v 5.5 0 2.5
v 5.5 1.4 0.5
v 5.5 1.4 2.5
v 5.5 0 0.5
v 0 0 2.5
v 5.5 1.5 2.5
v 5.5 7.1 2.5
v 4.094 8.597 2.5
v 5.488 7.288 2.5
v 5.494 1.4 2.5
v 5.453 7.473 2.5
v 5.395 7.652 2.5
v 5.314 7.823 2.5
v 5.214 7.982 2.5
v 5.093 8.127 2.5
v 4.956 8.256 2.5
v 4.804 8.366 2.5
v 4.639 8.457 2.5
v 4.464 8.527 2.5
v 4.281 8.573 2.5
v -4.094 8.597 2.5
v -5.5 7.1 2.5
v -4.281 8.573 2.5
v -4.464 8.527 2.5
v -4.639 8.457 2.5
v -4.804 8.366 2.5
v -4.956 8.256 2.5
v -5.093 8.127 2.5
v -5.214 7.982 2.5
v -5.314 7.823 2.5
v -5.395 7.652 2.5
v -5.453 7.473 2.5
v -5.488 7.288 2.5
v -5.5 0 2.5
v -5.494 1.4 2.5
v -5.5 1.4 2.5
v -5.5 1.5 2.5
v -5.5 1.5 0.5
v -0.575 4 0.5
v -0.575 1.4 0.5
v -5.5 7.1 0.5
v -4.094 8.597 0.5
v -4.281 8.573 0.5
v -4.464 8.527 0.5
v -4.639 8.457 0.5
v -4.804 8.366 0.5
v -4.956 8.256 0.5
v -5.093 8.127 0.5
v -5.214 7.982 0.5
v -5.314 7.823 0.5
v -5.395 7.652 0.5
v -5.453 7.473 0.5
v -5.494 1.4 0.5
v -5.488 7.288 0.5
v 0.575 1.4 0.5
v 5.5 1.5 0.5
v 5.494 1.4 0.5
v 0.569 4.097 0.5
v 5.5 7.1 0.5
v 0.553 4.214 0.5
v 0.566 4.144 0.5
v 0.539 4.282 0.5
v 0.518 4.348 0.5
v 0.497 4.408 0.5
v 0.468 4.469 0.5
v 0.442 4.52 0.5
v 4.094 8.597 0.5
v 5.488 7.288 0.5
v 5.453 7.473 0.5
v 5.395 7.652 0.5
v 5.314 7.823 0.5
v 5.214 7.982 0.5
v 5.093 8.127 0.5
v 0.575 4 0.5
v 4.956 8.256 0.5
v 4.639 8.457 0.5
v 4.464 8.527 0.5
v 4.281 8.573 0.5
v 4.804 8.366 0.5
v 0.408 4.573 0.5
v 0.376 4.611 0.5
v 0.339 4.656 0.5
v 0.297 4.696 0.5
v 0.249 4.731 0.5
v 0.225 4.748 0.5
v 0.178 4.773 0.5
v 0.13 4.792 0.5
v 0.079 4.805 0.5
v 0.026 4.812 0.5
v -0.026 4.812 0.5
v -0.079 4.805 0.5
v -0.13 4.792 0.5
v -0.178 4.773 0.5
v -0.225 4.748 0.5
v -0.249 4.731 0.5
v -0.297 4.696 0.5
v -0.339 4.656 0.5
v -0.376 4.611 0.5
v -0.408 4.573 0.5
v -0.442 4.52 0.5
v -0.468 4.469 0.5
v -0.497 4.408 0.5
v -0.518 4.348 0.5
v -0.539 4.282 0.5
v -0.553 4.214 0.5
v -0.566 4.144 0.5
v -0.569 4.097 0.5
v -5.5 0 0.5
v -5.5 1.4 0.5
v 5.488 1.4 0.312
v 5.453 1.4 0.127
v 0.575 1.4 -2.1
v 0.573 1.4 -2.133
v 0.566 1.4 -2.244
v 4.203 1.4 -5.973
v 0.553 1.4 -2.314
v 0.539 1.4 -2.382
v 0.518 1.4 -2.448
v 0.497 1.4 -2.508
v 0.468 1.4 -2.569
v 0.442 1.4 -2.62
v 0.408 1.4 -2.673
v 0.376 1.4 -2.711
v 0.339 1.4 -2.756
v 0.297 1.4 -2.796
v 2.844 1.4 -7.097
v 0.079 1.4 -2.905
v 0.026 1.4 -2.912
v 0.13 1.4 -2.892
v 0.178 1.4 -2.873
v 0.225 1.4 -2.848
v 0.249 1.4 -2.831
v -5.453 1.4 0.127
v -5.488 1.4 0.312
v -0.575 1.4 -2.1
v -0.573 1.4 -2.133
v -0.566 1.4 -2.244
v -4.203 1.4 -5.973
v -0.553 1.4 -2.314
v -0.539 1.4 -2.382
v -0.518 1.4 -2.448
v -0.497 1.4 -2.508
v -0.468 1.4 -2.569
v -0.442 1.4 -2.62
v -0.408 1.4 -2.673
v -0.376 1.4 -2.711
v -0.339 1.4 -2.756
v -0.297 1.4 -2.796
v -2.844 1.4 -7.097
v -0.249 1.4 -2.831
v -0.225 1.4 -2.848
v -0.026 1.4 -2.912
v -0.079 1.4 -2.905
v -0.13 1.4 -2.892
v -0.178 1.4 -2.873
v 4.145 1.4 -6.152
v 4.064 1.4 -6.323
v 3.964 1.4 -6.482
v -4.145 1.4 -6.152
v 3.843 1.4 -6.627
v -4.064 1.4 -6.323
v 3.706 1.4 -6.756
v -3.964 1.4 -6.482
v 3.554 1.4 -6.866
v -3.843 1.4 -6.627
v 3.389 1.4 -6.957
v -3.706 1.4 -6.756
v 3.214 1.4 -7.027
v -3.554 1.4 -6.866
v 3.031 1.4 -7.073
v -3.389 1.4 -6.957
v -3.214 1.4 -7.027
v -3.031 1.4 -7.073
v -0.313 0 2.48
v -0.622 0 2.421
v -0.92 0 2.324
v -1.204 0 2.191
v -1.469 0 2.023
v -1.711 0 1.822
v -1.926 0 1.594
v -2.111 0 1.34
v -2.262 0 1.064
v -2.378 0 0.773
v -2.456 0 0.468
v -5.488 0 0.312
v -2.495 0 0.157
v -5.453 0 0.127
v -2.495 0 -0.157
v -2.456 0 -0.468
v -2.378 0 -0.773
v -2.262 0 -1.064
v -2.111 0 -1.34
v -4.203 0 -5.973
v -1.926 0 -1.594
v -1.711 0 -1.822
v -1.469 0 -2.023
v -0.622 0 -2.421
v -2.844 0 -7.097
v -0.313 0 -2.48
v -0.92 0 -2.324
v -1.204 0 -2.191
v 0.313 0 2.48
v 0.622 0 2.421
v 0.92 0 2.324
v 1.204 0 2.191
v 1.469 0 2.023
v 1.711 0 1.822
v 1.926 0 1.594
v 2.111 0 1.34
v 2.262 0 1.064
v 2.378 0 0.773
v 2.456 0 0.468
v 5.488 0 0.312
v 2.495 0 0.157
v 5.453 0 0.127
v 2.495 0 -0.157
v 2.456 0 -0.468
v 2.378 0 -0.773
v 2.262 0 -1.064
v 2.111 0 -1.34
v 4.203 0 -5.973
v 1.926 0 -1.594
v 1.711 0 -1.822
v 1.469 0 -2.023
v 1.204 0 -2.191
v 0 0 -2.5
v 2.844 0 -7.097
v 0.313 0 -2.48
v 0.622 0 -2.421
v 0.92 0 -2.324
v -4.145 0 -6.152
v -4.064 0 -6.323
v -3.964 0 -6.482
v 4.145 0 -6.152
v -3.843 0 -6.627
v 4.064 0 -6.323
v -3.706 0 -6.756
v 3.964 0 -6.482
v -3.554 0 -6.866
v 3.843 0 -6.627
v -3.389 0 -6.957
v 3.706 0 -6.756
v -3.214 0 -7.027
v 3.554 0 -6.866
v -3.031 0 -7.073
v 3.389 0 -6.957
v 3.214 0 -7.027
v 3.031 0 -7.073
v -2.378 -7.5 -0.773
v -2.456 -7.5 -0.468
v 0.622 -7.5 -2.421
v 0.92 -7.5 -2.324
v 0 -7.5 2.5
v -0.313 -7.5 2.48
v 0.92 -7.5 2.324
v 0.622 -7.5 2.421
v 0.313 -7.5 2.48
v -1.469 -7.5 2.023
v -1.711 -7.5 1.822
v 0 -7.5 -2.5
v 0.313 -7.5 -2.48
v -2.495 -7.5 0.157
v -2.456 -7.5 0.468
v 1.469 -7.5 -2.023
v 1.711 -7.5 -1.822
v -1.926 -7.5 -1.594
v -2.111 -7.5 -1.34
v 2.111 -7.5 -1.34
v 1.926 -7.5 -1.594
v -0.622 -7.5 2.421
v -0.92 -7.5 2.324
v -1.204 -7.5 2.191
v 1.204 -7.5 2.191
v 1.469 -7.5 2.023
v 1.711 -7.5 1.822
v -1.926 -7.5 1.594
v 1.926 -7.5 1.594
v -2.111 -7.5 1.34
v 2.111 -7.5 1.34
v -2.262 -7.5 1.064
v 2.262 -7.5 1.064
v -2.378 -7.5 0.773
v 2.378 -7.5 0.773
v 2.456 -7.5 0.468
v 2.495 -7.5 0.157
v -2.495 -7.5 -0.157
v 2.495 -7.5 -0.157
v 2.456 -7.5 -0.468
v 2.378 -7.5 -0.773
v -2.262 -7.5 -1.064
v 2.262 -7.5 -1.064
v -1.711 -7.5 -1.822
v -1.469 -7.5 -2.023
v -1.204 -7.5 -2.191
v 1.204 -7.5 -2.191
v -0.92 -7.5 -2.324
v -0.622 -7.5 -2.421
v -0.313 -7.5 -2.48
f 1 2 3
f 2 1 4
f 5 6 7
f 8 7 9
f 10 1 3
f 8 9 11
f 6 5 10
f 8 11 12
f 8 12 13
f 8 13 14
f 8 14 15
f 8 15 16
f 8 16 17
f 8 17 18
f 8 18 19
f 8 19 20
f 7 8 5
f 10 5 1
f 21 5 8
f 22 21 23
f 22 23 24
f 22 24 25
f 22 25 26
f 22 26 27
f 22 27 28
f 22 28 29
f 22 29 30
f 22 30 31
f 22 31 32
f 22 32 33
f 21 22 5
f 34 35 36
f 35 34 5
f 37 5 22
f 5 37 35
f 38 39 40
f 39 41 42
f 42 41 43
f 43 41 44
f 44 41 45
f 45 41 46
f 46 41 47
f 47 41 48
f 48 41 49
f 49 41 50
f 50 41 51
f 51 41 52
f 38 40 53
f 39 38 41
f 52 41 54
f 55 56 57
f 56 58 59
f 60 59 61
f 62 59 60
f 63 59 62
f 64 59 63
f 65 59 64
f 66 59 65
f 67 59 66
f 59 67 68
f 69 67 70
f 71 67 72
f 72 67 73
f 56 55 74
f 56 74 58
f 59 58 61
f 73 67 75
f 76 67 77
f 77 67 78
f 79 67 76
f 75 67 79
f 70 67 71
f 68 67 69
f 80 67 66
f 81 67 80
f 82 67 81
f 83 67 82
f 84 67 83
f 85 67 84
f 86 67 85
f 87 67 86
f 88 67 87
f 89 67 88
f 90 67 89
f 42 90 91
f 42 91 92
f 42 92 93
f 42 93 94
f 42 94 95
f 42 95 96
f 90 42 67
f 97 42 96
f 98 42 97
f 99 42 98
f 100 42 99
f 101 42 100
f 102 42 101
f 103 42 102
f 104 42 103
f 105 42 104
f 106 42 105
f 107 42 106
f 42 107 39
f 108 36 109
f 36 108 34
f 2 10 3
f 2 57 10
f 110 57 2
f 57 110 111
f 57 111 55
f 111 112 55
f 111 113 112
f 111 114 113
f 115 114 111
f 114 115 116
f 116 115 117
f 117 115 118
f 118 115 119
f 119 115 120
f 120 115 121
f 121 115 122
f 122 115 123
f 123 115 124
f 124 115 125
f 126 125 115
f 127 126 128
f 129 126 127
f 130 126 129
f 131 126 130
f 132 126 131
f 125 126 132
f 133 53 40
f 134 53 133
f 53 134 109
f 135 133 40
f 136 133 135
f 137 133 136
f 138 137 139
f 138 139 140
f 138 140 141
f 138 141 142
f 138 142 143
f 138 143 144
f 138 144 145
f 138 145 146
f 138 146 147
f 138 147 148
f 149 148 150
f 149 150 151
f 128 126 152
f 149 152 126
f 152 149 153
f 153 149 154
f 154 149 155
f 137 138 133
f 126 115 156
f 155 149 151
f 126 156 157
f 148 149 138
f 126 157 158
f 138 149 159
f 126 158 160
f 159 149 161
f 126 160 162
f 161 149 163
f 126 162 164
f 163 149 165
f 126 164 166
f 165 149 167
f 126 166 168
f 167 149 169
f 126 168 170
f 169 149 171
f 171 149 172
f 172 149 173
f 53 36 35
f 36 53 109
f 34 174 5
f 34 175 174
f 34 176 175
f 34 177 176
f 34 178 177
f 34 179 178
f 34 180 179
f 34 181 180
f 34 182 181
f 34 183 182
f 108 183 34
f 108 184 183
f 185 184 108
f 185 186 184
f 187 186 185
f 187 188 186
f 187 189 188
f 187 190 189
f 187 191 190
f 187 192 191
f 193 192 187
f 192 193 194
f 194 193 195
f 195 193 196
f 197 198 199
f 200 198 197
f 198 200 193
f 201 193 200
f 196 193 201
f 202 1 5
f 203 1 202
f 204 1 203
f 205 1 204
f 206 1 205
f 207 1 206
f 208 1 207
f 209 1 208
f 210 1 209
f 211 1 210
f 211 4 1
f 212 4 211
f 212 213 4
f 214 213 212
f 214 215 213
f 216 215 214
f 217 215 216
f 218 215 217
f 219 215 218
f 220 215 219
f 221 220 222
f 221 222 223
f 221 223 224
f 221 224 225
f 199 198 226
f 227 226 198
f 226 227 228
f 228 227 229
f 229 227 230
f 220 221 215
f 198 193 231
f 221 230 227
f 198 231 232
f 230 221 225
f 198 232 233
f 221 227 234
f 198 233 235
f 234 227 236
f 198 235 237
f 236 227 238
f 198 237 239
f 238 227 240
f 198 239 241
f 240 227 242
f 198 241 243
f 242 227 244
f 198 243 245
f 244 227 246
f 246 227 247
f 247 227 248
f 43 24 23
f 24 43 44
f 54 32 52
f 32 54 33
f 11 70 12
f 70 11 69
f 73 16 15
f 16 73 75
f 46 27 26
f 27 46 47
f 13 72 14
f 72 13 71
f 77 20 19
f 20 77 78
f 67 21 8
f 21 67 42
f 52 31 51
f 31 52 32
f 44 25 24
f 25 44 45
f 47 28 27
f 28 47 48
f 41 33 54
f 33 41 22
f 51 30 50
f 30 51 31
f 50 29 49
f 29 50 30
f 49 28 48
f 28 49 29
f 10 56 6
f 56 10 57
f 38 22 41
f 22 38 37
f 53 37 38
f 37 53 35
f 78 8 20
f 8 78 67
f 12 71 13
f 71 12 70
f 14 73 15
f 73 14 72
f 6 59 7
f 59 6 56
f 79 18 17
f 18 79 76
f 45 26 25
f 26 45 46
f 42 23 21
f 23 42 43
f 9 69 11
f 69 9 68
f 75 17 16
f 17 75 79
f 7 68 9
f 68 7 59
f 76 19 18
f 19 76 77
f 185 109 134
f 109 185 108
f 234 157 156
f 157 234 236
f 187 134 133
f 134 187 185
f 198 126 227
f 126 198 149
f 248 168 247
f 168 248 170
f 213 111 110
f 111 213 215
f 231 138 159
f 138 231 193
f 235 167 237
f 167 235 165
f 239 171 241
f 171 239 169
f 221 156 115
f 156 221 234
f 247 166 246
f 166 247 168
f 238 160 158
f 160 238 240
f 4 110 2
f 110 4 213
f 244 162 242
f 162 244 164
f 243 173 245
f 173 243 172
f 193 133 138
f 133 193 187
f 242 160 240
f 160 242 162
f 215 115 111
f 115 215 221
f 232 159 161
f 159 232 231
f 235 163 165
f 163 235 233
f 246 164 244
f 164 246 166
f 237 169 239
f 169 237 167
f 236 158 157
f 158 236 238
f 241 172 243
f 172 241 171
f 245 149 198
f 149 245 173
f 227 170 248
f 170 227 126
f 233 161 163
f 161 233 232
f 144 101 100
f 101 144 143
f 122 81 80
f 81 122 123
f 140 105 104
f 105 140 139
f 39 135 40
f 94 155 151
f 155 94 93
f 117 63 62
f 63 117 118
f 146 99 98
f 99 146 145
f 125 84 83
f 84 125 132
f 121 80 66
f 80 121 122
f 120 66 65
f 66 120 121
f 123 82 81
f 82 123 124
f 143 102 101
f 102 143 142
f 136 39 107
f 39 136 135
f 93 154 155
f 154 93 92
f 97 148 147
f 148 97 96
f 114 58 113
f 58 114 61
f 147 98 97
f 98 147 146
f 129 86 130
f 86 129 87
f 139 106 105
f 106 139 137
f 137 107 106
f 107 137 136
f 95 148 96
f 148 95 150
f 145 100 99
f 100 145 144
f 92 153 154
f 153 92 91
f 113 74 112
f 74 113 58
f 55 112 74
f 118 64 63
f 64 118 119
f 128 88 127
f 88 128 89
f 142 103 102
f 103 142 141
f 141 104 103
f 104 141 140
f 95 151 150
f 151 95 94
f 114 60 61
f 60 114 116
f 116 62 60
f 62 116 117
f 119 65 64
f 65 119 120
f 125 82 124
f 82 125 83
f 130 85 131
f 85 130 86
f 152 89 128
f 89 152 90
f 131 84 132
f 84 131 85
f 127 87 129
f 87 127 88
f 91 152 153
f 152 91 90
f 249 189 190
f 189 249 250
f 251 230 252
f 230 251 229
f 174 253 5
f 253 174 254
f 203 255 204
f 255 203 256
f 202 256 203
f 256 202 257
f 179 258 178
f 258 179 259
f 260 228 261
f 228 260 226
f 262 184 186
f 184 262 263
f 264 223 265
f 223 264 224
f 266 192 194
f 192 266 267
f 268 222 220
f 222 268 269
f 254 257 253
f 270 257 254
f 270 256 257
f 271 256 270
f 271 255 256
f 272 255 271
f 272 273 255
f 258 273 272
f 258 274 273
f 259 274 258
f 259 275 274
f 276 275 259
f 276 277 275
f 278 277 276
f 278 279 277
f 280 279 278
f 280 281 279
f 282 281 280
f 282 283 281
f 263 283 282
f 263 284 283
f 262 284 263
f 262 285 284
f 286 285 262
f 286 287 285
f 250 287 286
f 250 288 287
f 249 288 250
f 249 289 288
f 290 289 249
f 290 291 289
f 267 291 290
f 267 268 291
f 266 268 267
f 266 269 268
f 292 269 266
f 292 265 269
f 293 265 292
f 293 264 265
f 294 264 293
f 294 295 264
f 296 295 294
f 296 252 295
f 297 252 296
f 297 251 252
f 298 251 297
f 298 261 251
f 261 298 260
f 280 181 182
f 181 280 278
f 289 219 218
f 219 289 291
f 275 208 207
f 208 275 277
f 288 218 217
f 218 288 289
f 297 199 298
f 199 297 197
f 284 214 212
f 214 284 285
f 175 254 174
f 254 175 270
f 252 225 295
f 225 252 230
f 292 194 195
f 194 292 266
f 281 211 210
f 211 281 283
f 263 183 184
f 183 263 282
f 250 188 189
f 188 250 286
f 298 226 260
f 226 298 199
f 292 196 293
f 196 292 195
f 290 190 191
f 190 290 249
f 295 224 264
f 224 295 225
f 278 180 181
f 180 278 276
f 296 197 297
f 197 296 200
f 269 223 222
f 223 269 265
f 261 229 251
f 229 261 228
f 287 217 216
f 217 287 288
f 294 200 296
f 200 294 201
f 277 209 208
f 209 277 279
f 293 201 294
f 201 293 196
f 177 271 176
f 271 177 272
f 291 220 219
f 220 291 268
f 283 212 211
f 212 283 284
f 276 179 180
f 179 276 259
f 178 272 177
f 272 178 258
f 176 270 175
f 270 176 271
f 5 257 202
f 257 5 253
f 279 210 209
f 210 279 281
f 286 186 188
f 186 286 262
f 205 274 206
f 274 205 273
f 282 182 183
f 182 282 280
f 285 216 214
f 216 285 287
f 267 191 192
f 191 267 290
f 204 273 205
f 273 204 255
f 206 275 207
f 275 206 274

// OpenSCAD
// Detail level
$fn = 50;

pin_depth = 7.5;
pin_diameter = 5;

support_thickness_upper = 2;
support_thickness_lower = 1.4;
support_thickness_taper_upper = 0;

support_rib_size = 6;
support_rib_thickness = 1.15;

support_depth = 11;
support_depth_lower = 8.5;

support_length_upper = 8.6;
support_length_lower = 9.6;
edge_radius = 1.5;

union() {
    rotate([0, 90, -90]) {
        cylinder(r=(pin_diameter/2), h=pin_depth);
    }
    translate([-support_depth/2, 0, pin_diameter/2 - support_thickness_upper]) {
        union() {
            cube([support_depth, support_thickness_lower, support_thickness_upper]);
            hull() {
                    translate([edge_radius, edge_radius, 0]) {
                        cylinder(r=(edge_radius), h=support_thickness_upper);
                    };
                    translate([support_depth - edge_radius, edge_radius, 0]) {
                        cylinder(r=(edge_radius), h=support_thickness_upper);
                    };
                    translate([edge_radius, support_length_upper - edge_radius, support_thickness_taper_upper]) {
                        cylinder(r=(edge_radius), h=support_thickness_upper - support_thickness_taper_upper);
                    };
                    translate([support_depth - edge_radius, support_length_upper - edge_radius, support_thickness_taper_upper]) {
                        cylinder(r=(edge_radius), h=support_thickness_upper - support_thickness_taper_upper);
                    };
                }
            rotate([-90, 0, 0]) {
                hull() {
                    translate([edge_radius, 0, 0]) {
                        cylinder(r=(edge_radius), h=support_thickness_lower);
                    };
                    translate([support_depth - edge_radius, 0, 0]) {
                        cylinder(r=(edge_radius), h=support_thickness_lower);
                    };
                    translate([edge_radius + ((support_depth - support_depth_lower) / 2), support_length_lower - edge_radius - support_thickness_upper, 0]) {
                        cylinder(r=(edge_radius), h=support_thickness_lower);
                    };
                    translate([support_depth_lower + ((support_depth - support_depth_lower) / 2) - edge_radius, support_length_lower - edge_radius - support_thickness_upper, 0]) {
                        cylinder(r=(edge_radius), h=support_thickness_lower);
                    };
                }
            }
        }
    }
    intersection() {
        hull() {
            translate([0, 0, pin_diameter/2]) {
                sphere(support_rib_thickness / 2);
            }
            translate([0, 0, pin_diameter/2 - support_rib_size]) {
                sphere(support_rib_thickness / 2);
            }
            translate([0, support_rib_size, pin_diameter/2]) {
                sphere(support_rib_thickness / 2);
            }
        }
        translate([-support_depth/2, 0, pin_diameter/2-support_length_lower]) {
            cube([support_depth, support_length_upper, support_length_lower]);
        }
    }
}
